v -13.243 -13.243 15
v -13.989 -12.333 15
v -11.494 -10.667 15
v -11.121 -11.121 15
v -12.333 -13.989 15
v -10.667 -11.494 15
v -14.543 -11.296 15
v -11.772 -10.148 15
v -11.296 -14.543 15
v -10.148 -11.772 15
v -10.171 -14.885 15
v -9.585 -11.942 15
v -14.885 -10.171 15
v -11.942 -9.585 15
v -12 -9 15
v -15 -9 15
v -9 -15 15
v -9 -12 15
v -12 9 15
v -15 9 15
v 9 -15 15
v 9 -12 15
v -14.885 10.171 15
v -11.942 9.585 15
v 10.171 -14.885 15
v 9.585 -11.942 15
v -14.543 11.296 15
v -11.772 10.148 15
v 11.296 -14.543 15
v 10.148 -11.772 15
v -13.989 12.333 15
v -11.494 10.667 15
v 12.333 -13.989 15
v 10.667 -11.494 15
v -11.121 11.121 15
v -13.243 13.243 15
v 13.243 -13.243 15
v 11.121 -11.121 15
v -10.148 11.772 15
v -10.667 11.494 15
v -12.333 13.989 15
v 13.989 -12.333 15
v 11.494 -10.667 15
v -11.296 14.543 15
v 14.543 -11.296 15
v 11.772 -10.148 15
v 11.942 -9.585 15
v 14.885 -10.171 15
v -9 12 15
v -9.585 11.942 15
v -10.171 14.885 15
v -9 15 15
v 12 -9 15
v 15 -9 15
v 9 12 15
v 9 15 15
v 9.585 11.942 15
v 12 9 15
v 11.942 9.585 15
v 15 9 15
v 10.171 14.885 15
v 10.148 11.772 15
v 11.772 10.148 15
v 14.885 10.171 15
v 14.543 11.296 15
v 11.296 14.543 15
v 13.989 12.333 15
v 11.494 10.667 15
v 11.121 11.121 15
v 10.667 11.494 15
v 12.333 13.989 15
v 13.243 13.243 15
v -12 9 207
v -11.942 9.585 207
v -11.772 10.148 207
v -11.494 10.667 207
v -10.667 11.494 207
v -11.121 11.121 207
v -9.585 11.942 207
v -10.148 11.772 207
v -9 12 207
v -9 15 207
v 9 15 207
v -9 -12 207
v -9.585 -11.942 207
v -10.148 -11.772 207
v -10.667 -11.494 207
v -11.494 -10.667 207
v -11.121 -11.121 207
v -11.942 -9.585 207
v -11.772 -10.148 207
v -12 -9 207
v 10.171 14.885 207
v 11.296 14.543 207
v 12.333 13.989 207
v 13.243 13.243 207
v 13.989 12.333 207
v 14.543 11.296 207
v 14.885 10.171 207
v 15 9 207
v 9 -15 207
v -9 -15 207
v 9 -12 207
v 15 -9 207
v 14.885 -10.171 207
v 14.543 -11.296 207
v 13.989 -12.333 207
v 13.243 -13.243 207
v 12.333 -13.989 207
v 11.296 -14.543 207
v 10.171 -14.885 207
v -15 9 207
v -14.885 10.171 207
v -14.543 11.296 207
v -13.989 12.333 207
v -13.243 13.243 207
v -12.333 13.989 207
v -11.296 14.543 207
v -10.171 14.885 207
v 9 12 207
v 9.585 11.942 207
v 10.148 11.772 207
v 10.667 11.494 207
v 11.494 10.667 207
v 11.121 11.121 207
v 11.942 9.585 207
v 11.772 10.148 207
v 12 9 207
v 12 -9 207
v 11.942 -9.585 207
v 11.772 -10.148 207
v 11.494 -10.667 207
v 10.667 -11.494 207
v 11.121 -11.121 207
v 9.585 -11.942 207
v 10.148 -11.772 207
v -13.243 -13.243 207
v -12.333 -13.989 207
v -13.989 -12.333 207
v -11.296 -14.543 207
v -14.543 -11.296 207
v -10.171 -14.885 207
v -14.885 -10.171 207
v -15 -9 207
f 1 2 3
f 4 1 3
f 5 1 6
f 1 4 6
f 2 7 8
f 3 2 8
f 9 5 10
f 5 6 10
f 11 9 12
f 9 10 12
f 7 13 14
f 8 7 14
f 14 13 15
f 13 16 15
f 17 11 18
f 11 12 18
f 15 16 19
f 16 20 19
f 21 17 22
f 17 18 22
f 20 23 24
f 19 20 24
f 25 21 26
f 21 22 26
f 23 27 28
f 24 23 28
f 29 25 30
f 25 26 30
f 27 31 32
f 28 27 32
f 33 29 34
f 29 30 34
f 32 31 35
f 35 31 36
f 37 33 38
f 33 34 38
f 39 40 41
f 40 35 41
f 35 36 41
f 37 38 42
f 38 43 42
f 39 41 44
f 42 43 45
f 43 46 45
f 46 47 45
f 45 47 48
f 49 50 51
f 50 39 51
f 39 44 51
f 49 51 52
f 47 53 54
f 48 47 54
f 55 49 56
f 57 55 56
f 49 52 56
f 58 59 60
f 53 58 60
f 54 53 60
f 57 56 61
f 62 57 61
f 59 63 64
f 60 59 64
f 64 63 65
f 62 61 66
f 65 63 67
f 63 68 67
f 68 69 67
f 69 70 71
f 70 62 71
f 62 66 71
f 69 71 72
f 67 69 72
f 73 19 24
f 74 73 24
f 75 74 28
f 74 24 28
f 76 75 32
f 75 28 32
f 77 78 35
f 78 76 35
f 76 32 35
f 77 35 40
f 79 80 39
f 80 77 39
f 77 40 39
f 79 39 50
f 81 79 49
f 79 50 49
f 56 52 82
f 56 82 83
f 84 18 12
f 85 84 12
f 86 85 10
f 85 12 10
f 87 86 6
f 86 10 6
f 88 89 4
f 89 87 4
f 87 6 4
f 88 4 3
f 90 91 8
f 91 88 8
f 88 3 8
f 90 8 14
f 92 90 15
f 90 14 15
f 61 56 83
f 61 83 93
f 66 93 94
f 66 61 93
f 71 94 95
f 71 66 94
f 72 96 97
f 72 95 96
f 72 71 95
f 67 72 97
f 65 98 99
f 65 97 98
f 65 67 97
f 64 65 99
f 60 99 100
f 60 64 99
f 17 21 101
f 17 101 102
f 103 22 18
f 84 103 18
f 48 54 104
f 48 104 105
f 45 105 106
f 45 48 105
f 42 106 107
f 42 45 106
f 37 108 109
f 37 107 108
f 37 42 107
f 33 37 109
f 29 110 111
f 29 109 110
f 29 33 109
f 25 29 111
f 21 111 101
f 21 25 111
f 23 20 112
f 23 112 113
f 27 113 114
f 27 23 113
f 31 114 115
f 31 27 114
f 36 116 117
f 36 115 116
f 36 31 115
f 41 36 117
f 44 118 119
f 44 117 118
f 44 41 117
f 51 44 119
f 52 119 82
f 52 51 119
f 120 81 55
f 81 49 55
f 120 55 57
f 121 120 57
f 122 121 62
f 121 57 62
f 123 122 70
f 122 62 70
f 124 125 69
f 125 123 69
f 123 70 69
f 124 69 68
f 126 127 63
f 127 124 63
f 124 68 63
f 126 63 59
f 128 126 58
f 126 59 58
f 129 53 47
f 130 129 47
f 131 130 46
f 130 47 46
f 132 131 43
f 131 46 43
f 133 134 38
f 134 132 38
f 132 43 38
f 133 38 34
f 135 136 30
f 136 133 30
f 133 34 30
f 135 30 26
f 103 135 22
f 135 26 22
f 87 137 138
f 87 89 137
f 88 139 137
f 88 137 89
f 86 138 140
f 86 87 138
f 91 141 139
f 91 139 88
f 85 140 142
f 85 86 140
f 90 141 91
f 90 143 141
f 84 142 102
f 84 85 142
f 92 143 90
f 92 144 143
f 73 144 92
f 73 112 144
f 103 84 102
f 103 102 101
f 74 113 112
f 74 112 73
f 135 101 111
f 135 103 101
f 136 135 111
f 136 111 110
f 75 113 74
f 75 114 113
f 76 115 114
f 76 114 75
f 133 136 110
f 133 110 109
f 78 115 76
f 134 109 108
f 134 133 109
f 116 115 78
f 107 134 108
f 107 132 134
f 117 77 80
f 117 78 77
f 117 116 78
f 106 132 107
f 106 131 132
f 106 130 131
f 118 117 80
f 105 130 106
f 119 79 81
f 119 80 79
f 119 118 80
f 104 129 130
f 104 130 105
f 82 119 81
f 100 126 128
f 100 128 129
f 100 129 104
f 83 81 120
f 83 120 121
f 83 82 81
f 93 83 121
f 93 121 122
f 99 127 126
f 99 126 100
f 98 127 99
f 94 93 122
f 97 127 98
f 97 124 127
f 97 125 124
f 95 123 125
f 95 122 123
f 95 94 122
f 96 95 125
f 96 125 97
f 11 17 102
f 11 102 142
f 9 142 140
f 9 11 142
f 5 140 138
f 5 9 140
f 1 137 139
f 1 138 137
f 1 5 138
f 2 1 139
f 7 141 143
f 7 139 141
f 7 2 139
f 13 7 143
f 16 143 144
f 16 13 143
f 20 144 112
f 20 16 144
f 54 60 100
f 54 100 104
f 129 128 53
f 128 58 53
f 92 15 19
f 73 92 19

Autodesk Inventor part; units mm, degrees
ref_plane "Start Plane" through (0, 0, 15) normal (0, 0, 1) x (1, 0, 0)
ref_plane "End Plane" through (0, 0, 207) normal (0, 0, 1) x (1, 0, 0)
sketch "Sketch" plane through (0, 0, 0) normal (0, 0, 1) x (1, 0, 0)
  line L0 (-15, -9) -> (-15, 9)
  line L1 (-9, 15) -> (9, 15)
  line L2 (15, 9) -> (15, -9)
  line L3 (9, -15) -> (-9, -15)
  arc A0 (-15, -9) -> (-9, -15) centre (-9, -9) ccw
  arc A1 (-9, 15) -> (-15, 9) centre (-9, 9) ccw
  arc A2 (15, 9) -> (9, 15) centre (9, 9) ccw
  arc A3 (9, -15) -> (15, -9) centre (9, -9) ccw
  arc A4 (-9, 12) -> (-12, 9) centre (-9, 9) ccw
  line L4 (-9, 12) -> (9, 12)
  arc A5 (12, 9) -> (9, 12) centre (9, 9) ccw
  line L5 (12, 9) -> (12, -9)
  arc A6 (9, -12) -> (12, -9) centre (9, -9) ccw
  line L6 (9, -12) -> (-9, -12)
  arc A7 (-12, -9) -> (-9, -12) centre (-9, -9) ccw
  line L7 (-12, -9) -> (-12, 9)
  line L8 (0, 22.7397) -> (0, -22.7397) construction
  line L9 (-22.7397, 0) -> (22.7397, 0) construction
  dimension "d7" = 6
  dimension "d10" = 30
  dimension "d11" = 30
  dimension "d12" = 3
  dimension "d15" = 15
  dimension "d16" = 15
extrude "Body" add sketch "Sketch" along normal up to surface (192 mm away) from surface at 15
sketch "Sketch3" plane through (0, 0, 0) normal (0, 0, 1) x (1, 0, 0)
  line L0 (0, 0) -> (10, 0)
ref_plane "Work Plane3" through (0, 0, 0) normal (0, -1, 0) x (1, 0, 0)
ref_plane "Work Plane4" through (-9, -370, 15) normal (0, 0, -1) x (-1, 0, 0)
split "Split1" plane through (-9, -370, 15) removes the side toward (0, 0, -1)
ref_plane "Work Plane5" through (-9, 130, 207) normal (0, 0, 1) x (1, 0, 0)
split "Split2" plane through (-9, 130, 207) removes the side toward (0, 0, 1)
sketch "Sketch4" plane through (0, 0, 0) normal (0, -1, 0) x (1, 0, 0)
  line L0 (-2, 15) -> (12, 15) projected
  line L1 (-2, 207) -> (12, 207) projected
  dimension "d18" = 192
equation "\"d7\" = G_IR"
equation "\"d10\" = G_H"
equation "\"d11\" = G_W"
equation "\"d12\" = G_T"
equation "\"d15\" = 0.5 * d10"
equation "\"d16\" = 0.5 * d11"
equation "\"d3\" = G_L"
equation "\"G_W\" = 30"
equation "\"G_H\" = 30"
equation "\"G_T\" = 3"
equation "\"G_IR\" = 6"
equation "\"G_L\" = d18"
equation "\"G_OFFSET_START\" = -15"
equation "\"G_OFFSET_END\" = -15"
equation "\"d13\" = -G_OFFSET_START"
equation "\"d14\" = G_OFFSET_END + B_L"
equation "\"B_L\" = 222"
properties part number "DIN EN 10219-2 - 30 x 30 x 3  - 192" material "Steel, Mild"
